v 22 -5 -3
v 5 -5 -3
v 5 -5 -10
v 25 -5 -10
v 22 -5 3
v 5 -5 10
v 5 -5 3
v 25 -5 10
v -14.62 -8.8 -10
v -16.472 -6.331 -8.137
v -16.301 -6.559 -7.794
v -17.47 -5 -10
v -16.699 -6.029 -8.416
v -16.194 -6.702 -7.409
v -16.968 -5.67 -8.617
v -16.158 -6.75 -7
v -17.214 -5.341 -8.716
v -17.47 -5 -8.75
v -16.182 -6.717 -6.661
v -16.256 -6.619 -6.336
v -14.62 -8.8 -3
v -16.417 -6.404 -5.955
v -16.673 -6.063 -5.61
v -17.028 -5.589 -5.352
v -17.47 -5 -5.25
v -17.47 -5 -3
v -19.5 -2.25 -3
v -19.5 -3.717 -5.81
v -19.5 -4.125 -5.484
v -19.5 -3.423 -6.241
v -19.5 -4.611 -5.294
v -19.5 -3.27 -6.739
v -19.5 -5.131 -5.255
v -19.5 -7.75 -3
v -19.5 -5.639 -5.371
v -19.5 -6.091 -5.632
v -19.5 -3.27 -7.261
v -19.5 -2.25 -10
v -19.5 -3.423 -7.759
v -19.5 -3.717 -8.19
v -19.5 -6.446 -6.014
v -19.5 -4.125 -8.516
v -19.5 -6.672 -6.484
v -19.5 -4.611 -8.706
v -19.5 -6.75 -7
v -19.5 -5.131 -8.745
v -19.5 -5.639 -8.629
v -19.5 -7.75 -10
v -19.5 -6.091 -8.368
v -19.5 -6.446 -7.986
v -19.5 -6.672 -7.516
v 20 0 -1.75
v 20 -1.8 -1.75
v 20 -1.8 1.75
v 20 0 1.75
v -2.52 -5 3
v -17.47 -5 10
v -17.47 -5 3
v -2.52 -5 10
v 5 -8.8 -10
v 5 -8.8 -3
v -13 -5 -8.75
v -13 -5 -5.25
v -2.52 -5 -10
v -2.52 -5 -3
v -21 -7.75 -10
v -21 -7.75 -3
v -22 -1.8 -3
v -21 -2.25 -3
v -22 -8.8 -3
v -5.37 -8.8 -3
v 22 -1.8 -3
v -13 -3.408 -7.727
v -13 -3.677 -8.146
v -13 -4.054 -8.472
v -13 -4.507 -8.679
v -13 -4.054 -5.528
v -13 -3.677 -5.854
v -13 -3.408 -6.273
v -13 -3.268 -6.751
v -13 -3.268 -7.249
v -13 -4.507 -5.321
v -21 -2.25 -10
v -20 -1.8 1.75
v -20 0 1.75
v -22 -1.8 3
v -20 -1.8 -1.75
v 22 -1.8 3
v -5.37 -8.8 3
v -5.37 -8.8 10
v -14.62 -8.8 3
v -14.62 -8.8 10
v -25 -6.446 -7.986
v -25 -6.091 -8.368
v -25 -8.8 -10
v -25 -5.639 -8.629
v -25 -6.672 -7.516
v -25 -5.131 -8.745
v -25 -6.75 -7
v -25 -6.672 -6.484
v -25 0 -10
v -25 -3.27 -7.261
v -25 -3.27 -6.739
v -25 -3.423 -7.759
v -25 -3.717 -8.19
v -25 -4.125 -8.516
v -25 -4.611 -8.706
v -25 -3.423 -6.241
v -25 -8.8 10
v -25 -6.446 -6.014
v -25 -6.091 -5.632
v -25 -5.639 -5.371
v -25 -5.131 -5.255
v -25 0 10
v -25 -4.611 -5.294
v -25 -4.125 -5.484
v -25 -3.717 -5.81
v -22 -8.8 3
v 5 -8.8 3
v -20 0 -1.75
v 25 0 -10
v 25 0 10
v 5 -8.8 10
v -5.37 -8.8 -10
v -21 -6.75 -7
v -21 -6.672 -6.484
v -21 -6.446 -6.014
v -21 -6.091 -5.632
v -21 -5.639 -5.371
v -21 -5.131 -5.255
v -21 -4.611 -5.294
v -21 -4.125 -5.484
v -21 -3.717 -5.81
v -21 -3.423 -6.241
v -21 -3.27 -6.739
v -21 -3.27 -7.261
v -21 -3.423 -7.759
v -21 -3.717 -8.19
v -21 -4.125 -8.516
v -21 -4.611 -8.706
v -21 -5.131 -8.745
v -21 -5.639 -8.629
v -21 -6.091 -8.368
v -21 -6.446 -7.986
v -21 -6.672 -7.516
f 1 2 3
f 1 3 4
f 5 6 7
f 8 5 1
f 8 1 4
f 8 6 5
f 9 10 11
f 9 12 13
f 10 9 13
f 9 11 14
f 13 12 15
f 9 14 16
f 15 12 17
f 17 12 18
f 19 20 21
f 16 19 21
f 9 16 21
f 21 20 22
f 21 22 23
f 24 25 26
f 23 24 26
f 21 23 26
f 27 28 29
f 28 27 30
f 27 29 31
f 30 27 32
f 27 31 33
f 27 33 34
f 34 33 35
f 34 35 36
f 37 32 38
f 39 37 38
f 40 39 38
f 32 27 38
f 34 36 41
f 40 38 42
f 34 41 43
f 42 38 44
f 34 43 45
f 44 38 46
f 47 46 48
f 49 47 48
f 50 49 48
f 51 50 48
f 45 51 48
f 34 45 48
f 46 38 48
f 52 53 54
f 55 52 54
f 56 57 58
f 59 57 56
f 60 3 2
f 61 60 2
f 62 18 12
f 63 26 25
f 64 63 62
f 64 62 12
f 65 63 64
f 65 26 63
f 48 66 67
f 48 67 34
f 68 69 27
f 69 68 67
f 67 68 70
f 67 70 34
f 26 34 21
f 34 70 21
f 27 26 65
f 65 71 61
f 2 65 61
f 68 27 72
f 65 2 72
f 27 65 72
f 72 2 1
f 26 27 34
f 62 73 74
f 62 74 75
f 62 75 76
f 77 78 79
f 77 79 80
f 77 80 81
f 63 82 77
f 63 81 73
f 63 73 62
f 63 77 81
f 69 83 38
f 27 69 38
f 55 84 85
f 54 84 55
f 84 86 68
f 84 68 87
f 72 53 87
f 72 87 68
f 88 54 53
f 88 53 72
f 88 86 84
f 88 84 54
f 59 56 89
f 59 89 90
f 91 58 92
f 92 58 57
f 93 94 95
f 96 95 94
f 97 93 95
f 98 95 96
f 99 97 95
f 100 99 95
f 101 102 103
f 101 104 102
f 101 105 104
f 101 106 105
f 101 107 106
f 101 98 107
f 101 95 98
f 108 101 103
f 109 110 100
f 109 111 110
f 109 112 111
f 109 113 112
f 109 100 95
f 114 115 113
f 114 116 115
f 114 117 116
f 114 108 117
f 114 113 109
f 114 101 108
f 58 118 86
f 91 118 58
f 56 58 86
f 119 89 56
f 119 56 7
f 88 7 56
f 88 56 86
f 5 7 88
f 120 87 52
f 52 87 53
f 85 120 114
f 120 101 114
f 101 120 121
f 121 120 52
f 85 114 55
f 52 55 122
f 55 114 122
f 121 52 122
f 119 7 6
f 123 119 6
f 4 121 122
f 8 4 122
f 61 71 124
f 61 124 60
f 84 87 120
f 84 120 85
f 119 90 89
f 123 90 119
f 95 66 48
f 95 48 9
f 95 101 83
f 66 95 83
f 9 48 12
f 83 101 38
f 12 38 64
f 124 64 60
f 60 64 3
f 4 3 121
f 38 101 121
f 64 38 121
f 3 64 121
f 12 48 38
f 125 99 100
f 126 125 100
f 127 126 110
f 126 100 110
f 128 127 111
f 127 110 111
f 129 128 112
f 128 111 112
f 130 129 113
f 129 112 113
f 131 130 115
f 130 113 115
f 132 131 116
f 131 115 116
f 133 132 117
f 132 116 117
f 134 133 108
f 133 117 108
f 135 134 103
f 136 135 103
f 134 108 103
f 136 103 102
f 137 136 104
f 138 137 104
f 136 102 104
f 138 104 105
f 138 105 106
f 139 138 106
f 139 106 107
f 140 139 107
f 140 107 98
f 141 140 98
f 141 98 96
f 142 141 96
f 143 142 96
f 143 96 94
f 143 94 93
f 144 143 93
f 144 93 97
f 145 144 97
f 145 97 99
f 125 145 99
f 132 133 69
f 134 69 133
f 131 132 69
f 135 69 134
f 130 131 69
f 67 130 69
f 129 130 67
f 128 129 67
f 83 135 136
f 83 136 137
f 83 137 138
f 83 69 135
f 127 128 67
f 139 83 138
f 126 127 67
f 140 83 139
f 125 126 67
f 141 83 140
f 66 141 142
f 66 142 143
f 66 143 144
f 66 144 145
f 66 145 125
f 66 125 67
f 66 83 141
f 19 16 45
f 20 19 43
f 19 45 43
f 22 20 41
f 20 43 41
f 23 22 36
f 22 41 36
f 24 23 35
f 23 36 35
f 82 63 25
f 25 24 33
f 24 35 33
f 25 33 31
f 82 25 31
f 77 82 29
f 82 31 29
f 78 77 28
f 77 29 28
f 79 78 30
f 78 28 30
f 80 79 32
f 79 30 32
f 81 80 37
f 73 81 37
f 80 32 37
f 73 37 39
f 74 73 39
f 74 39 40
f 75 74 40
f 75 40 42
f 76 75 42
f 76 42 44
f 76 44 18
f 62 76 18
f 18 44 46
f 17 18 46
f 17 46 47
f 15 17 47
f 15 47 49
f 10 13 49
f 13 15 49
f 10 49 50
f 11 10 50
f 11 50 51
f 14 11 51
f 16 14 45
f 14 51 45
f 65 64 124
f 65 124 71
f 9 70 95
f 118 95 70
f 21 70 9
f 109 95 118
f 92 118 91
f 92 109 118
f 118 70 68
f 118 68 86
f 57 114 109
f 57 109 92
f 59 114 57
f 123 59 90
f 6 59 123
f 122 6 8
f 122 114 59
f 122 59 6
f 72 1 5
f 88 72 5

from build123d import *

# Parameters (mm, degrees)
F0_W      = 50
F0_H      = 20
F1_DEPTH  = 5
F2_W      = 30
F2_H      = 20
F3_DEPTH  = 3.8
F4_W      = 15.25
F4_H      = 20
F5_DEPTH  = 4
F6_SIZE2  = 3.99999
F6_SIZE   = 2.99999
F9_W      = 40
F9_H      = 3.5
F10_DEPTH = 12.5
F11_W     = 44
F11_H     = 6
F12_DEPTH = 7
F13_R     = 1.75
F14_DEPTH = 12
F15_W     = 1.5
F15_H     = 5.5
F16_DEPTH = 8


# Not quite as in the source:
# - a fillet or chamfer is up to 0.001 mm smaller than in the source, because OpenCascade refuses the exact size


with BuildPart() as f1:
    # F0 (on Front) → F1 (new body)
    with BuildSketch(Plane.XZ):
        Rectangle(F0_W, F0_H)
    extrude(amount=F1_DEPTH)


with BuildPart() as f3:
    # F2 (on face) → F3 (new body)
    with BuildSketch(Plane.XZ.offset(5)):
        with Locations((-10, 0)):
            Rectangle(F2_W, F2_H)
    extrude(amount=F3_DEPTH)


with BuildPart() as f5:
    # F4 (on face) → F5 (new body)
    with BuildSketch(Plane.XZ.offset(8.8)):
        with Locations((-9.995, 0)):
            Rectangle(F4_W, F4_H)
    extrude(amount=-F5_DEPTH)

    # F6 (size 3 and 4 in the source; OpenCascade refuses exactly that, so slightly less here)
    f6_edges = [f5.edges().sort_by_distance(p)[0] for p in [
        (-2.37, -8.8, 0),
        (-17.62, -8.8, 0),
    ]]
    f6_side = f5.faces().sort_by_distance((-9.995, -8.8, 0))[0]
    chamfer(f6_edges, length=F6_SIZE, length2=F6_SIZE2, reference=f6_side)


with BuildPart() as f3_1:
    add(f3.part)

    # F7: cut F5
    add(f5.part, mode=Mode.SUBTRACT)


with BuildPart() as f1_1:
    add(f1.part)

    # F8: union F3
    add(f3_1.part)

    # F9 (on face) → F10 (cut, symmetric)
    with BuildSketch(Plane.XZ.offset(8.8)):
        Rectangle(F9_W, F9_H)
    extrude(amount=F10_DEPTH, both=True, mode=Mode.SUBTRACT)

    # F11 (on face) → F12 (cut)
    with BuildSketch(Plane.XZ.offset(8.8)):
        Rectangle(F11_W, F11_H)
    extrude(amount=-F12_DEPTH, mode=Mode.SUBTRACT)

    # F13 (on face) → F14 (cut)
    with BuildSketch(Plane(origin=(-25, 0, 0), x_dir=(0, -1, 0), z_dir=(-1, 0, 0))):
        with Locations((5, -7)):
            Circle(F13_R)
    extrude(amount=-F14_DEPTH, mode=Mode.SUBTRACT)

    # F15 (on face) → F16 (cut)
    with BuildSketch(Plane(origin=(0, 0, -10), x_dir=(1, 0, 0), z_dir=(0, 0, -1))):
        with Locations((-20.25, 5)):
            Rectangle(F15_W, F15_H)
    extrude(amount=-F16_DEPTH, mode=Mode.SUBTRACT)


solid = f1_1.part
